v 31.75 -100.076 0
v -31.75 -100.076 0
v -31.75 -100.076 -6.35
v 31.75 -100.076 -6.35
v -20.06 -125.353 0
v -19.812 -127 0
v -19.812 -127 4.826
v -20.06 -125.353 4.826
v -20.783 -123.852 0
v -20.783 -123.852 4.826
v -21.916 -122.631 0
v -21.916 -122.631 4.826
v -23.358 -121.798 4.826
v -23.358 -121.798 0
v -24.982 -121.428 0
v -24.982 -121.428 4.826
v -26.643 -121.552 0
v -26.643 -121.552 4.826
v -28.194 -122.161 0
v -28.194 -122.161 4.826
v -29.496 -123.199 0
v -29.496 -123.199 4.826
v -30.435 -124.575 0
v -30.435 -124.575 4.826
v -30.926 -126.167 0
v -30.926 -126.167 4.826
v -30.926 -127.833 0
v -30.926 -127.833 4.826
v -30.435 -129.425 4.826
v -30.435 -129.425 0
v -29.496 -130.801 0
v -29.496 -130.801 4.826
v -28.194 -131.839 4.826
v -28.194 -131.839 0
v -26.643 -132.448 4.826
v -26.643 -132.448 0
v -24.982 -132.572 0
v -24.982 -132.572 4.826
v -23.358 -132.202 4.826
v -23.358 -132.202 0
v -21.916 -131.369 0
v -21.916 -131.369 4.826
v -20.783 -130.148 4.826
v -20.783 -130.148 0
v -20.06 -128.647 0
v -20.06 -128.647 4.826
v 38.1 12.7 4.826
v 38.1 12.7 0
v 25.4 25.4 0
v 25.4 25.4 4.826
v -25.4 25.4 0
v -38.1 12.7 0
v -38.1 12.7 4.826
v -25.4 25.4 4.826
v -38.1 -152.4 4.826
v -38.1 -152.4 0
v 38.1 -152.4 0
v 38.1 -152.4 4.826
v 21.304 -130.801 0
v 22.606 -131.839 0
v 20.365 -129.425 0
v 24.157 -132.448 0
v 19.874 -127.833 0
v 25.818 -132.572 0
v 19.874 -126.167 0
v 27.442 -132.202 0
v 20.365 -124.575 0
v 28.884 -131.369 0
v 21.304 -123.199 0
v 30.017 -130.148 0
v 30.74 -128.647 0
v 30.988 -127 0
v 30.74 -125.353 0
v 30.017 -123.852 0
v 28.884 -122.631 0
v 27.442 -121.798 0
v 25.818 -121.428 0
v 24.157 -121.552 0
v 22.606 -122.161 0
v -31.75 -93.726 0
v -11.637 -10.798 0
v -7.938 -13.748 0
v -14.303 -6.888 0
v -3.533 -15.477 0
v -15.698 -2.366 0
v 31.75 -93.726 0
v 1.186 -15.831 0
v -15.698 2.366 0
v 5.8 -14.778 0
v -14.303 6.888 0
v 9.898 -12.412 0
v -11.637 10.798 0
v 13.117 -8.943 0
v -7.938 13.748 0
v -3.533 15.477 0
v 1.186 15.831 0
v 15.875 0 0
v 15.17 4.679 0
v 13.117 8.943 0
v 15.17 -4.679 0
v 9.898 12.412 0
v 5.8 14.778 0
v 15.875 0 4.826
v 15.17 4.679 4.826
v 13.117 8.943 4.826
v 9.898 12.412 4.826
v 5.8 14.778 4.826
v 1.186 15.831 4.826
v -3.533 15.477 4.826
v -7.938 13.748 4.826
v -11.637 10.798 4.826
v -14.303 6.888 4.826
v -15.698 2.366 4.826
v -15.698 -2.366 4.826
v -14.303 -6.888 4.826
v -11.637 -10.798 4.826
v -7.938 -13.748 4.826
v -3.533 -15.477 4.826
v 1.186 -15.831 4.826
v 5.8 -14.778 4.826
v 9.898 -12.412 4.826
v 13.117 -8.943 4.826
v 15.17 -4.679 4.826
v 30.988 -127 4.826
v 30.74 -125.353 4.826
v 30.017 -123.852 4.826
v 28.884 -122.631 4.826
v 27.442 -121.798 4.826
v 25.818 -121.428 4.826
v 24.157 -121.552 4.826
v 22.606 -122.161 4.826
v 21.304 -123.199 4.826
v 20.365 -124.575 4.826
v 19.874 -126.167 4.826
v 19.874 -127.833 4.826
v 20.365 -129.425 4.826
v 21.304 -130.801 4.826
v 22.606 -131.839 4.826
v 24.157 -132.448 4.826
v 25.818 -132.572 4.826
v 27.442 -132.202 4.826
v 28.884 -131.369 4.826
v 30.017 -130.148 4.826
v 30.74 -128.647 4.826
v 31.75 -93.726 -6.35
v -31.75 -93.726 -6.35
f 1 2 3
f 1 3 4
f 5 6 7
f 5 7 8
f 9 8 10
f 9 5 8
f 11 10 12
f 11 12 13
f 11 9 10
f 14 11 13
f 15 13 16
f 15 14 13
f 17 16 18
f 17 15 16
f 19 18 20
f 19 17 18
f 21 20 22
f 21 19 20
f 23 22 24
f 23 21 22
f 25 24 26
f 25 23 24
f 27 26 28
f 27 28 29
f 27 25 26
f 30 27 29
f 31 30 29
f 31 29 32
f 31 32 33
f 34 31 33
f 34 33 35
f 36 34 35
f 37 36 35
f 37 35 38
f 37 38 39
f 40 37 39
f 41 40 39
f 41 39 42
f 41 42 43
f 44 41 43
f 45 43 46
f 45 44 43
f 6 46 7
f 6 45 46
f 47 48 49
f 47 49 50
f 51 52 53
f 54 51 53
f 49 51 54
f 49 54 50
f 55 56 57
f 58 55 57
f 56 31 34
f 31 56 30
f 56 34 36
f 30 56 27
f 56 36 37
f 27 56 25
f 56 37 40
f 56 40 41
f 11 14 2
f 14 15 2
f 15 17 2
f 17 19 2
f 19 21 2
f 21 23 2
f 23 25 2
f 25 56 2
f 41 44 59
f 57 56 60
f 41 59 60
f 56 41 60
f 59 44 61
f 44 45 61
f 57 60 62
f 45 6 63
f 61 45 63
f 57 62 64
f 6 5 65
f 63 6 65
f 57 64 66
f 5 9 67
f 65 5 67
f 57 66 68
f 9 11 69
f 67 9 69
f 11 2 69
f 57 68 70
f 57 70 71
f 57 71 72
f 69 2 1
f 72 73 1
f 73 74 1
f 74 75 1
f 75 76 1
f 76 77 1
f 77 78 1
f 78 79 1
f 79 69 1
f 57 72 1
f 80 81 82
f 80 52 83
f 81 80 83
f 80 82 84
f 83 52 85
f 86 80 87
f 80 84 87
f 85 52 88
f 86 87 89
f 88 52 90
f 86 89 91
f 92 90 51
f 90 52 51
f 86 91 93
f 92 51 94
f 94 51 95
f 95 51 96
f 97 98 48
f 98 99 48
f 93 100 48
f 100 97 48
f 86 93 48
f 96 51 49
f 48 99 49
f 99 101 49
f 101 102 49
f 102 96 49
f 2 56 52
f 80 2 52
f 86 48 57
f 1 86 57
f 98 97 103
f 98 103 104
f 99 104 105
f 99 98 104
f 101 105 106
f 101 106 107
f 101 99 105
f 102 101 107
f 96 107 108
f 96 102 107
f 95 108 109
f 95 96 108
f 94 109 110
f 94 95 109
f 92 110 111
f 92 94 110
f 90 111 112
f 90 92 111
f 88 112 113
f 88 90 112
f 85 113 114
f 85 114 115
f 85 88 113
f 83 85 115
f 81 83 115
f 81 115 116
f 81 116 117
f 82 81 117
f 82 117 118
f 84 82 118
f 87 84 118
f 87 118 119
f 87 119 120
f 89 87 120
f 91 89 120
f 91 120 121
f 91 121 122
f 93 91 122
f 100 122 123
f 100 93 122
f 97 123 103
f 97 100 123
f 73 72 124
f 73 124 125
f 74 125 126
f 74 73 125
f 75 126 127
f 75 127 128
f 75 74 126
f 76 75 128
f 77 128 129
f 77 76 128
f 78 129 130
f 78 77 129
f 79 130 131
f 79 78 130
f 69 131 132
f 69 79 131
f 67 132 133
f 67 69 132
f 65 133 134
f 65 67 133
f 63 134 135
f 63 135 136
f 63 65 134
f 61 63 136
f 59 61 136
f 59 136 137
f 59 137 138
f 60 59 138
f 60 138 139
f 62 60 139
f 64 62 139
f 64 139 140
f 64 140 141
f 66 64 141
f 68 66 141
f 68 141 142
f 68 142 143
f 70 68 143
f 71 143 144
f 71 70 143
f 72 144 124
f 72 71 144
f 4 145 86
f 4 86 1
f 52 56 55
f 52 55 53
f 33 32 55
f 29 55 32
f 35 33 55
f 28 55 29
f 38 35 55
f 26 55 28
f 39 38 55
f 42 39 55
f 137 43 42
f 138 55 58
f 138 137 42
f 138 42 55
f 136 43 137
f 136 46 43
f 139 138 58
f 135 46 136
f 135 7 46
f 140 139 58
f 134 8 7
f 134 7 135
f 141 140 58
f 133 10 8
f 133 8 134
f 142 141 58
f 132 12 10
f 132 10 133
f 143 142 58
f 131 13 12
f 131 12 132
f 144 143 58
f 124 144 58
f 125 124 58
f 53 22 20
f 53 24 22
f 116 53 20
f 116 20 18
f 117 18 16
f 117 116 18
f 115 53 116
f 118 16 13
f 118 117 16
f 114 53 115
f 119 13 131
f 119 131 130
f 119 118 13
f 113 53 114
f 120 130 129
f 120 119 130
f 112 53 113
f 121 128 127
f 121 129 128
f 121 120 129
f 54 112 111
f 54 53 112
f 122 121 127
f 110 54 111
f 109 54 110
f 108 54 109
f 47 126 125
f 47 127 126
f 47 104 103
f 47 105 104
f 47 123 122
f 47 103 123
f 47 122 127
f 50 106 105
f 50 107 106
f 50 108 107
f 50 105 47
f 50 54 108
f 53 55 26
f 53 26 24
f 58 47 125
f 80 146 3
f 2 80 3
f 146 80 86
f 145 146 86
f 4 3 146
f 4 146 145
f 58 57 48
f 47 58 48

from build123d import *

# Parameters (mm, degrees)
F0_W     = 76.2
F0_H     = 177.8
F0_R     = 5.588
F0_R_2   = 15.875
F1_DEPTH = 4.826
F2_SIZE  = 12.7
F3_W     = 63.5
F3_H     = 6.35
F4_DEPTH = 6.35


with BuildPart() as f1:
    # F0 (on Top) → F1 (new body)
    with BuildSketch(Plane.XY):
        with Locations((0, -63.5)):
            Rectangle(F0_W, F0_H)
        with Locations((-25.4, -127)):
            Circle(F0_R, mode=Mode.SUBTRACT)
        with Locations((25.4, -127)):
            Circle(F0_R, mode=Mode.SUBTRACT)
        Circle(F0_R_2, mode=Mode.SUBTRACT)
    extrude(amount=F1_DEPTH)

    # F2
    f2_edges = [f1.edges().sort_by_distance(p)[0] for p in [
        (38.1, 25.4, 2.413),
        (-38.1, 25.4, 2.413),
    ]]
    chamfer(f2_edges, length=F2_SIZE)

    # F3 (on face) → F4 (join)
    with BuildSketch(Plane(origin=(0, 0, 0), x_dir=(1, 0, 0), z_dir=(0, 0, -1))):
        with Locations((0, 96.901)):
            Rectangle(F3_W, F3_H)
    extrude(amount=F4_DEPTH)


solid = f1.part
